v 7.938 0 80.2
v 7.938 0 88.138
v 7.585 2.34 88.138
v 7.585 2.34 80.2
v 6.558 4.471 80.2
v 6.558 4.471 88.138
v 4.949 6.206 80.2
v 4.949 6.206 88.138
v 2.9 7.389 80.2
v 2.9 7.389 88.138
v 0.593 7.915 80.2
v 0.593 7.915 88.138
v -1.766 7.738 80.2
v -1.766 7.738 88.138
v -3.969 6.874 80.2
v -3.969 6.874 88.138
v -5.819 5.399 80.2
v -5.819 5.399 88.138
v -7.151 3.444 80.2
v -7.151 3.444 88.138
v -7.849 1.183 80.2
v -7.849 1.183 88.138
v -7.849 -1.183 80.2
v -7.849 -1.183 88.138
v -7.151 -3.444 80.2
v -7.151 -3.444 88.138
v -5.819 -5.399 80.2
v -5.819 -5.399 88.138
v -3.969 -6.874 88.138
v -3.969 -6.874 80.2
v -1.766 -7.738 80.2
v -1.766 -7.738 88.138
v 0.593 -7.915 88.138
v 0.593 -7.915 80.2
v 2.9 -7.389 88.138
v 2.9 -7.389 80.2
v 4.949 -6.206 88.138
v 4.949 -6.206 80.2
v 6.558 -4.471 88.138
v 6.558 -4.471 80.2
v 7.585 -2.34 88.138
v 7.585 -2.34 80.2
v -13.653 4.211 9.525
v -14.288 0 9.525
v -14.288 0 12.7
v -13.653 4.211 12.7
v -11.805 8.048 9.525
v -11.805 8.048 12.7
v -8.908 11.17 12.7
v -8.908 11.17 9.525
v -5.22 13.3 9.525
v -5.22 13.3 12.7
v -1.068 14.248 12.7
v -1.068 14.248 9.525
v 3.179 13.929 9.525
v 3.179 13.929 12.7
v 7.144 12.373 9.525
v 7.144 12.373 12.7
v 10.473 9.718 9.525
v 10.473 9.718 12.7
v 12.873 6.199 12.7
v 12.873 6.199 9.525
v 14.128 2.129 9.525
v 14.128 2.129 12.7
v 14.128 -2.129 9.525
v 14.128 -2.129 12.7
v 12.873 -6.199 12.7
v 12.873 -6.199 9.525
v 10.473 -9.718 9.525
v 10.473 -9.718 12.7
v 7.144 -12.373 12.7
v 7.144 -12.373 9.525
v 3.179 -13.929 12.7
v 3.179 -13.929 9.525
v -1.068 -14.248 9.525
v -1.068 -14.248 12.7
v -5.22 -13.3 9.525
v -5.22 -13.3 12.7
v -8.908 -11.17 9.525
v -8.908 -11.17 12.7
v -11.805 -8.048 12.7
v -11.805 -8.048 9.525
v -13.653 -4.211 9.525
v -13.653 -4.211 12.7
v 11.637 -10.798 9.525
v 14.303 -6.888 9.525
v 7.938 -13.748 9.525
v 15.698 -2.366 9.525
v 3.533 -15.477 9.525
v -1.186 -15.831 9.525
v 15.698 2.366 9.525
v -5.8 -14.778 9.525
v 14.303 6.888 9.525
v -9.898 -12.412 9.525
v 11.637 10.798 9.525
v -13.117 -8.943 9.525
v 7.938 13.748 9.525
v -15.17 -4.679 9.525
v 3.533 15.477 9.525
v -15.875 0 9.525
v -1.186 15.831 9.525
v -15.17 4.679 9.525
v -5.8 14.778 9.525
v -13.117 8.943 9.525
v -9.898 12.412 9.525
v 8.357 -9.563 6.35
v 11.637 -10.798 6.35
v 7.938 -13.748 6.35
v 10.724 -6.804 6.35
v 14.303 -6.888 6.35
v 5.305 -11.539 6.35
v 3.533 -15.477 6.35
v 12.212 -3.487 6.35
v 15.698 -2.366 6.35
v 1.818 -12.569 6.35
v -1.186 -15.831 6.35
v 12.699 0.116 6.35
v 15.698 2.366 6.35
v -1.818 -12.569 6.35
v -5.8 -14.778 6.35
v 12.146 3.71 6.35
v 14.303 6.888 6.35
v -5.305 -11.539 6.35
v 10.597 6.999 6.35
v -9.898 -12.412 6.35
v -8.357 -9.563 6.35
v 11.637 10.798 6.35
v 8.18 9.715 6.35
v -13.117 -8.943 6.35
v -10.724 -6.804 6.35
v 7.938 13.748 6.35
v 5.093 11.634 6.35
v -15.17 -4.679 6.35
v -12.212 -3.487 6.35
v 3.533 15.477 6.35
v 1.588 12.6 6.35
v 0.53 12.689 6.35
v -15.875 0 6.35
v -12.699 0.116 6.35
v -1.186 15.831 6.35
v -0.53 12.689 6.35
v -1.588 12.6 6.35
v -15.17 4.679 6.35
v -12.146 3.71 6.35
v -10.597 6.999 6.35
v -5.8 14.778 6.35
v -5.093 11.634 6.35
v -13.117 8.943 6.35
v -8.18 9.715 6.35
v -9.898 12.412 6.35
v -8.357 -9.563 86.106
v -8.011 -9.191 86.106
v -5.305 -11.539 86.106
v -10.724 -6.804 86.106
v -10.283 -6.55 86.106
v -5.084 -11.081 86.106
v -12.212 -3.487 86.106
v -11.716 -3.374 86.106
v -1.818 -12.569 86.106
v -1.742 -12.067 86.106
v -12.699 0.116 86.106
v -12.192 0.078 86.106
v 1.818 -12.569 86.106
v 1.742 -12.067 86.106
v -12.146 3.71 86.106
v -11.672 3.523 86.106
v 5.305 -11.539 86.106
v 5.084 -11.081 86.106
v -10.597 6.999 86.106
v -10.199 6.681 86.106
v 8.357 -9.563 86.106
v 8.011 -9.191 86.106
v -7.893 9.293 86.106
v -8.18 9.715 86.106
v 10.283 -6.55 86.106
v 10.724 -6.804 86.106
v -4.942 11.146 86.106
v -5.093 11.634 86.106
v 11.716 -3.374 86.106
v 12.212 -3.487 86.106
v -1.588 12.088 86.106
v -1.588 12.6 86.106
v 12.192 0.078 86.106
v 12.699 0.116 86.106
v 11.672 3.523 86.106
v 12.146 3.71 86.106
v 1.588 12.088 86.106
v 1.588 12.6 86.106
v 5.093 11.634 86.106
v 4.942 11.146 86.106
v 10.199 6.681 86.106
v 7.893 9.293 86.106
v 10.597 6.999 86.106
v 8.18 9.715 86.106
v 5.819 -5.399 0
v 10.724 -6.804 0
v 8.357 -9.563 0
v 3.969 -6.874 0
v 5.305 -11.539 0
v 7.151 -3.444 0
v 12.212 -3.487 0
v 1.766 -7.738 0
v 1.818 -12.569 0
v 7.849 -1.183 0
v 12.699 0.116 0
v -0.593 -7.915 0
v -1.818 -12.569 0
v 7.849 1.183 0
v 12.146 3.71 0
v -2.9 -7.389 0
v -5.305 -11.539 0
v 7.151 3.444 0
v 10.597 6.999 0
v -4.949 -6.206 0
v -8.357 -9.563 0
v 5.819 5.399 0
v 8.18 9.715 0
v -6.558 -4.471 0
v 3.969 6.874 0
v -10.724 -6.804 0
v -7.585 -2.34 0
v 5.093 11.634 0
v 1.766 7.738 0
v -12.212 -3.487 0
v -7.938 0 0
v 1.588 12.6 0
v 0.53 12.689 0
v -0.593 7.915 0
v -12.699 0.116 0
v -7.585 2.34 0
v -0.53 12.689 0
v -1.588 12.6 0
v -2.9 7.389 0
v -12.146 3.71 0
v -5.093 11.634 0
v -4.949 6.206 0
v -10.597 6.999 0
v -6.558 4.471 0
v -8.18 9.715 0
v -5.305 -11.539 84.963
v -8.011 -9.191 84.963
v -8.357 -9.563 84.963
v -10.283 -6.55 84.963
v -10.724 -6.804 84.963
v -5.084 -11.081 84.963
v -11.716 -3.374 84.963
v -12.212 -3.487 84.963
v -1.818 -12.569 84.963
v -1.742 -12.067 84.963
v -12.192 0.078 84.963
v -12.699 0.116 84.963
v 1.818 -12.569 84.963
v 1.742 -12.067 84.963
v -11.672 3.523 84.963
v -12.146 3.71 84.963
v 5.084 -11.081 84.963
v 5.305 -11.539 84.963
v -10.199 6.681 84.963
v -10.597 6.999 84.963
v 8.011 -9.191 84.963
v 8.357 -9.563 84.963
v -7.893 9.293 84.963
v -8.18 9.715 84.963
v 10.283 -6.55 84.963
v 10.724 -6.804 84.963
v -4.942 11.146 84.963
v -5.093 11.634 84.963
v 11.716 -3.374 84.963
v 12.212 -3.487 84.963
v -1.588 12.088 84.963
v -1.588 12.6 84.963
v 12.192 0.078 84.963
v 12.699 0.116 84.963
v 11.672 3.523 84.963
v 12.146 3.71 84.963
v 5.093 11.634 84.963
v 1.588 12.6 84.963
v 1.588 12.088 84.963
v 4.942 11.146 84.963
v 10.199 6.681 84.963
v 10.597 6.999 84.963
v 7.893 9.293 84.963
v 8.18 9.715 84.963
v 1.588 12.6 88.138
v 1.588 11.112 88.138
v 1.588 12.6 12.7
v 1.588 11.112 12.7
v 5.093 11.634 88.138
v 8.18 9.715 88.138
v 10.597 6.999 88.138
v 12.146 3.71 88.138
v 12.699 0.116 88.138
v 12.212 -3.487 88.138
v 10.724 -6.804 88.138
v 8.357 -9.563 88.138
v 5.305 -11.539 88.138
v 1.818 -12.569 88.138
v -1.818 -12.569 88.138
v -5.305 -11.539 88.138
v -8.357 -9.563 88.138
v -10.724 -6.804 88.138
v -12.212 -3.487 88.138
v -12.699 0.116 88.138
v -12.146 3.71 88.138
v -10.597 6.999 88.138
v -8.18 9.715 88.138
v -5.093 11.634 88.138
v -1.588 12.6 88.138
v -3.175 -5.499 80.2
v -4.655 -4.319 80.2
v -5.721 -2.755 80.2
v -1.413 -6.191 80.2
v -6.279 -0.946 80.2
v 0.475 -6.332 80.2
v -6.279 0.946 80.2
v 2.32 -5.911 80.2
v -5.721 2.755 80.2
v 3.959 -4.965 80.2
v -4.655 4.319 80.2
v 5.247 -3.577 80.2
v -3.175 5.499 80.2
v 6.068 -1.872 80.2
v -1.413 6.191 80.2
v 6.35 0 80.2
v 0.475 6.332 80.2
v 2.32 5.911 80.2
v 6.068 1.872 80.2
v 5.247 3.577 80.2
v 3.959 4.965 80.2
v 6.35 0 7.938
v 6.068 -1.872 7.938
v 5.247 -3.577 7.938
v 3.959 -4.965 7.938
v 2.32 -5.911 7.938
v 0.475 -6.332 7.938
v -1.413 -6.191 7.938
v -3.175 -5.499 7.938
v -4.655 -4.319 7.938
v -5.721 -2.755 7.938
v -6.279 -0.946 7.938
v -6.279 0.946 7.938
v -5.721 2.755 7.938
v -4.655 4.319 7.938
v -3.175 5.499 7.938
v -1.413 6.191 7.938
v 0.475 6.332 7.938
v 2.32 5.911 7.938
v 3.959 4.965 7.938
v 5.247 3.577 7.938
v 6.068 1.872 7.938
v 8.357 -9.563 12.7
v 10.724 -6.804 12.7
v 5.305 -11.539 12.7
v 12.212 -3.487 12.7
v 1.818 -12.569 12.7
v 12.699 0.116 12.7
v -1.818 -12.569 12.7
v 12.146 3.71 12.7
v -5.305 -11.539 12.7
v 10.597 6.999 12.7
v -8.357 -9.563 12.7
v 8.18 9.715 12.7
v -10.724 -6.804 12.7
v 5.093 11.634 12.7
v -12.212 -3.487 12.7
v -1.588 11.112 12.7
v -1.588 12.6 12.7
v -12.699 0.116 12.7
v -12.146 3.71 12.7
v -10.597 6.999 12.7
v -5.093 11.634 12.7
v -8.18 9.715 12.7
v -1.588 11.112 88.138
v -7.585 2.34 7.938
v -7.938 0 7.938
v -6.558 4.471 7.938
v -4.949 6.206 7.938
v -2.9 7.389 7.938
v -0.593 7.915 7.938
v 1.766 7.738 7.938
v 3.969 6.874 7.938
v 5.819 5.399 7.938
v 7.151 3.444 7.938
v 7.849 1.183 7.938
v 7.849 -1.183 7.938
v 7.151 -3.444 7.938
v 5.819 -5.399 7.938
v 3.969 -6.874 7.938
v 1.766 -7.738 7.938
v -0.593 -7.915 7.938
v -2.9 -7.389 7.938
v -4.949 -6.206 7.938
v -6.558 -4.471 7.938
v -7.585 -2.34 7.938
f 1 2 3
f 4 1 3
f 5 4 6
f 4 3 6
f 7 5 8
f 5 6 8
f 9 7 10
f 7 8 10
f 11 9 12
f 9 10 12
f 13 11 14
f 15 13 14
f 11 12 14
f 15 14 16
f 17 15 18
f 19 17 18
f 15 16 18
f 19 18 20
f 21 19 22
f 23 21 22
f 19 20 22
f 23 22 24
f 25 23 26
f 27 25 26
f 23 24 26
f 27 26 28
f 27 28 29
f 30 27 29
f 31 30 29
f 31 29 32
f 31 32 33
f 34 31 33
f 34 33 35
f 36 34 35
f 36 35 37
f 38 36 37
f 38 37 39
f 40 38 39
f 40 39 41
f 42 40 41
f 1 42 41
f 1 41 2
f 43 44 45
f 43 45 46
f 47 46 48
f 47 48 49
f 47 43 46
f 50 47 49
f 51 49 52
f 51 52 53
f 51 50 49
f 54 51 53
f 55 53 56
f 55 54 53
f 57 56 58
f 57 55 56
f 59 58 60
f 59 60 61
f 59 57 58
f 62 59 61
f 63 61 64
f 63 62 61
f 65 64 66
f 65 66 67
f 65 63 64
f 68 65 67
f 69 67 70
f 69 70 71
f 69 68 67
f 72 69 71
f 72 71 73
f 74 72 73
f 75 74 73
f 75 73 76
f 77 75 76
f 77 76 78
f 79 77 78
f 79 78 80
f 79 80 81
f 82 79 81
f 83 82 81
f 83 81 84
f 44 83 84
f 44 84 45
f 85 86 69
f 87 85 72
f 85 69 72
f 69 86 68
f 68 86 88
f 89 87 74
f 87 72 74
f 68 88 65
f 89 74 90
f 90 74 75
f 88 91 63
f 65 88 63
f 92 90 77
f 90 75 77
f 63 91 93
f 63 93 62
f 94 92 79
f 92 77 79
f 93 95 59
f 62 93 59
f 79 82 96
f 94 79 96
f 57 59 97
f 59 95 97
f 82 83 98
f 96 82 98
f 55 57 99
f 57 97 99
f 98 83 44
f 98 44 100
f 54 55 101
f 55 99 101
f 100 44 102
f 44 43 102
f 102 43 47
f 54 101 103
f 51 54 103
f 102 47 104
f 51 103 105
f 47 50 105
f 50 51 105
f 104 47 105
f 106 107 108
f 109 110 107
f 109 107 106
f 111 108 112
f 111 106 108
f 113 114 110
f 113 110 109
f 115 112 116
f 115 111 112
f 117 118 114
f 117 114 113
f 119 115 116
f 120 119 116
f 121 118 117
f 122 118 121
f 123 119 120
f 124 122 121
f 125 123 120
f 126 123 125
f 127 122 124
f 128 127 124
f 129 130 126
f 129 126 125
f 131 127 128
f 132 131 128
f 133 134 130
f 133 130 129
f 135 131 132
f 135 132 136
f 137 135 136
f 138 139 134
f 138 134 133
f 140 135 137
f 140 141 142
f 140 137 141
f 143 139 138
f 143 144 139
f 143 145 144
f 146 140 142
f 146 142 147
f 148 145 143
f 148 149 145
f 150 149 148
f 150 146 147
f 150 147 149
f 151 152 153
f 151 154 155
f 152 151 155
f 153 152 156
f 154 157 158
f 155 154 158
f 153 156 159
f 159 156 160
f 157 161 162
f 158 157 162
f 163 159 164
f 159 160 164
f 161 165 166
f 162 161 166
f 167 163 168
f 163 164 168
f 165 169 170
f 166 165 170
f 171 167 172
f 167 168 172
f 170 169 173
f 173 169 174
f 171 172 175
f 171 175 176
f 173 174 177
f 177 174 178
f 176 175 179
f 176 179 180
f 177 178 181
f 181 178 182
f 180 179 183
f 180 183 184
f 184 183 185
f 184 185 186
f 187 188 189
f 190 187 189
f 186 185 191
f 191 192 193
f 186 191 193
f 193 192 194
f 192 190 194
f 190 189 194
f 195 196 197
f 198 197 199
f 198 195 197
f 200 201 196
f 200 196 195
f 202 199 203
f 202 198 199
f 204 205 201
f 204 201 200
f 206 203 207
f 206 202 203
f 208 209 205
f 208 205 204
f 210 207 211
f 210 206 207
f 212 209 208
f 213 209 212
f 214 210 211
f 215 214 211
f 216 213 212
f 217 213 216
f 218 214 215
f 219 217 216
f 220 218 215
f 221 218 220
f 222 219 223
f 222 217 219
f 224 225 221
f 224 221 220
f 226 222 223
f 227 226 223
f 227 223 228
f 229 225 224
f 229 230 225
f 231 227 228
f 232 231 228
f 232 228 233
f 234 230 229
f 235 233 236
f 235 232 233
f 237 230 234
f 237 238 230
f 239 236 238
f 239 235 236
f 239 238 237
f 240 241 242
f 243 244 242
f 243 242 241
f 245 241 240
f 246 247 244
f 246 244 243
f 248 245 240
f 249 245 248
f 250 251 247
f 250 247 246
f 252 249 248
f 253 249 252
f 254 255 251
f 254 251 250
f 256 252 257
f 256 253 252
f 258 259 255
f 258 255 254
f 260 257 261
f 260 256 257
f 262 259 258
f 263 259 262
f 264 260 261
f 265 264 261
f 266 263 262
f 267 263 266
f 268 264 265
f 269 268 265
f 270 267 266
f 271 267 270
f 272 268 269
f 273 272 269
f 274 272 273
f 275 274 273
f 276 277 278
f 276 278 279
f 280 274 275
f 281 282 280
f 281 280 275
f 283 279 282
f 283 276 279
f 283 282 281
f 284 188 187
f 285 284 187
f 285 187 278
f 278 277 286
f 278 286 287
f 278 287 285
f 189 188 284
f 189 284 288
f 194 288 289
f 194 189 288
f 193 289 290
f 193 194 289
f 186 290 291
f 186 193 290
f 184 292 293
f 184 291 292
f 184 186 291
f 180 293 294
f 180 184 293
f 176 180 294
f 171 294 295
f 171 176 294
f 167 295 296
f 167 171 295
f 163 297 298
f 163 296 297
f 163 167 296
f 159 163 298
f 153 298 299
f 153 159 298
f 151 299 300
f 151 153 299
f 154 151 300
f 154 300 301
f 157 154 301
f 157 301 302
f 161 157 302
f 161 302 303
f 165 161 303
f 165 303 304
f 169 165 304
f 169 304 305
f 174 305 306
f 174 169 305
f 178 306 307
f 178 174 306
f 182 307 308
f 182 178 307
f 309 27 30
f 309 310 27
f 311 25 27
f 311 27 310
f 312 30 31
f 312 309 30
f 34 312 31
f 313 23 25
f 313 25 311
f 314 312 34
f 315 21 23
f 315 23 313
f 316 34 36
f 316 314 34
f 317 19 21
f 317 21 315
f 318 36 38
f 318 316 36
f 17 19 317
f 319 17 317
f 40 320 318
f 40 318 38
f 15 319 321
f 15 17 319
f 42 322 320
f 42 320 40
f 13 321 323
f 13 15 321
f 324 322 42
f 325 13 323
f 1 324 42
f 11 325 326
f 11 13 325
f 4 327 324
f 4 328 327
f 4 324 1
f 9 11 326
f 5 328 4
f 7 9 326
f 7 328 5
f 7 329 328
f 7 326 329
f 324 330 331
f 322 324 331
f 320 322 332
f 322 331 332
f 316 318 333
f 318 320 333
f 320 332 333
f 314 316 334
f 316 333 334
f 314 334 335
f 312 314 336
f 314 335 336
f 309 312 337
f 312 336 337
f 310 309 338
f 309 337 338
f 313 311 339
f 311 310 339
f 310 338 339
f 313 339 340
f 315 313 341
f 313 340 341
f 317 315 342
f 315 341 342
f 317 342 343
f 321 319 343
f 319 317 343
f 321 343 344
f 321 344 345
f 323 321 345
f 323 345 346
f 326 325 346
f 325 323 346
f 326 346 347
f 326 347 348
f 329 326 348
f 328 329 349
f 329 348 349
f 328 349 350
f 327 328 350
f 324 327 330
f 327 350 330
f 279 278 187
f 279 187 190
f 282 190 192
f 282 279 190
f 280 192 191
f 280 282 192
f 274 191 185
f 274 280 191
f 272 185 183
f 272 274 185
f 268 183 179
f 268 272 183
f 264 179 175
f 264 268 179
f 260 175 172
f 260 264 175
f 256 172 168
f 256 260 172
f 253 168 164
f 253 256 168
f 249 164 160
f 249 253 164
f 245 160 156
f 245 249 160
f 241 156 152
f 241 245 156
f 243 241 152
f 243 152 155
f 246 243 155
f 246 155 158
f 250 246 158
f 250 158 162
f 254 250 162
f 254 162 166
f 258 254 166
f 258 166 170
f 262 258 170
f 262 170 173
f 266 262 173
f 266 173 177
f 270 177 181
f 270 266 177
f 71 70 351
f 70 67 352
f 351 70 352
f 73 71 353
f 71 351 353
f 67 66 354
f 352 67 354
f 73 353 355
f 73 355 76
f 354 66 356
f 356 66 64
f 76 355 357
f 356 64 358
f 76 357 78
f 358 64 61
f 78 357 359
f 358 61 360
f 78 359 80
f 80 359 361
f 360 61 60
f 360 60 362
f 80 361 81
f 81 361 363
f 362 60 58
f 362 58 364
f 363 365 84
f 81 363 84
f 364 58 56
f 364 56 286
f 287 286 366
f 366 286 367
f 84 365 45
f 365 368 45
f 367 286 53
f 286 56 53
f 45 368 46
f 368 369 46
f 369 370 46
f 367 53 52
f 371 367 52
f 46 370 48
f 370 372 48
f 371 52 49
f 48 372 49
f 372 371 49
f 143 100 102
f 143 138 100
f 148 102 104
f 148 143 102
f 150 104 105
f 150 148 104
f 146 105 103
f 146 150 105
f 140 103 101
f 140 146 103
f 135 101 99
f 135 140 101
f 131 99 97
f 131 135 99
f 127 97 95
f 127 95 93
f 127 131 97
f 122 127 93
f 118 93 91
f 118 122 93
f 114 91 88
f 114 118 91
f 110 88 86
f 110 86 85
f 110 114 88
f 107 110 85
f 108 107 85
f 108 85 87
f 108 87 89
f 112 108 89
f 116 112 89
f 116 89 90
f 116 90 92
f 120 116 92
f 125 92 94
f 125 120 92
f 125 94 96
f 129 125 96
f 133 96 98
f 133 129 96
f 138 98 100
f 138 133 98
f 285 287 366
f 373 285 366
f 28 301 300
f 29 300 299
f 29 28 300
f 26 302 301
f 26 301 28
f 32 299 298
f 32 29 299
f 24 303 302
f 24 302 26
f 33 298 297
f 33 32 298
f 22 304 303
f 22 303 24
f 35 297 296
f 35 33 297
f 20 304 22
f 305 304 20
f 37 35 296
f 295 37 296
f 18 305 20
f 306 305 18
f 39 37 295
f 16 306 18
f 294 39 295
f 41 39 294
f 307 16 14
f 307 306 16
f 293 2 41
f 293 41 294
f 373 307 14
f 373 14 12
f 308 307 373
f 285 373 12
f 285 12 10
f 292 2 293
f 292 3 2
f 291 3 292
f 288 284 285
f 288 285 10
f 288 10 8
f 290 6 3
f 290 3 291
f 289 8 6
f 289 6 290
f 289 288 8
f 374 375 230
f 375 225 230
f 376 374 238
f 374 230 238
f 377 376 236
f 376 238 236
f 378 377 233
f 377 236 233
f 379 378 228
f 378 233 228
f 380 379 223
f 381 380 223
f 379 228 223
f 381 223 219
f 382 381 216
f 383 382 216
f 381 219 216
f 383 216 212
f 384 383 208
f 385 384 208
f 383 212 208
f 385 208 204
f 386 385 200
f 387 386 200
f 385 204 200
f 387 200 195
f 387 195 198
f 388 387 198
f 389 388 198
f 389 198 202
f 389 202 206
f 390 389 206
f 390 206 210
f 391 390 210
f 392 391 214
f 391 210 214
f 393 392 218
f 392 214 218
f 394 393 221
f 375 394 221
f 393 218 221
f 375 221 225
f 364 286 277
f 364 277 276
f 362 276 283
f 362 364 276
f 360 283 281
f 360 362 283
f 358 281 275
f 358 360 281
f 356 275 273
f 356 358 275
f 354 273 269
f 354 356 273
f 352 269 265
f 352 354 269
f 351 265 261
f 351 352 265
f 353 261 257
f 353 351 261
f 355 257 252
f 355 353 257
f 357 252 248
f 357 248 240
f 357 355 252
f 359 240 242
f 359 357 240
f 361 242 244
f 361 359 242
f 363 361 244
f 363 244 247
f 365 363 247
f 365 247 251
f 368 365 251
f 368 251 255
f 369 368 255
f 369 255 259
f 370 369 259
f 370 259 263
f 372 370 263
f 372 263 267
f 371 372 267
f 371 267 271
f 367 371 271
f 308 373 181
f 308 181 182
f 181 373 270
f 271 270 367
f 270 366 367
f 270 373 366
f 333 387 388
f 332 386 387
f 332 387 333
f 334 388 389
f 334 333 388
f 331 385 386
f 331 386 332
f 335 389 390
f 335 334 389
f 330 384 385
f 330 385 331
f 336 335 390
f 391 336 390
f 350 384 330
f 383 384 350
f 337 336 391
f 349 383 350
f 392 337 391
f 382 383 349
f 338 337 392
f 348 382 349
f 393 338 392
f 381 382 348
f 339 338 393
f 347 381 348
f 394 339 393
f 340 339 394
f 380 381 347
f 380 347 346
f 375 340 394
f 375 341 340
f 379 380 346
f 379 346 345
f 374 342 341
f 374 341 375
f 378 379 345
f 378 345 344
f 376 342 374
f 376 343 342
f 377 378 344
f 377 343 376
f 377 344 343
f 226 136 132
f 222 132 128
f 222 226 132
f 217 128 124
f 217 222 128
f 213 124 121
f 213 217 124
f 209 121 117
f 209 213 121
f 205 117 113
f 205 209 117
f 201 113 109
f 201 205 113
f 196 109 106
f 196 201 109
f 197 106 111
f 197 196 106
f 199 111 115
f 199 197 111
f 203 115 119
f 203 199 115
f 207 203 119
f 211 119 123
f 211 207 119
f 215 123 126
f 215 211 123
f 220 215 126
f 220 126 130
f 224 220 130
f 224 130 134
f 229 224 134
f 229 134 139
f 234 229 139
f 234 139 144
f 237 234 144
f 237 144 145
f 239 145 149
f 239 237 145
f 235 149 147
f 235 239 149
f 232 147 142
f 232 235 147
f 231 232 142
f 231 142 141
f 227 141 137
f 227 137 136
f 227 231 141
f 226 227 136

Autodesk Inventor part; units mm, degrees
sketch "Sketch1" plane through (0, 0, 0) normal (0, 0, 1) x (1, 0, 0)
  circle A0 centre (0, 0) radius 12.7
  circle A1 centre (0, 0) radius 6.35
  line L0 (-1.5875, 14.2875) -> (1.5875, 14.2875)
  line L1 (1.5875, 14.2875) -> (1.5875, 11.1125)
  line L2 (1.5875, 11.1125) -> (-1.5875, 11.1125)
  line L3 (-1.5875, 11.1125) -> (-1.5875, 14.2875)
  dimension "d0" = 25.4
  dimension "d4" = 12.7
  dimension "d50" = 3.175
  dimension "d51" = 3.175
  dimension "d52" = 1.5875
  dimension "d53" = 14.2875
extrude "Extrusion4" add sketch "Sketch1" along normal blind 88.138 contours A0 L3 L2 L1 | L1 L2 L3 A0
ref_plane "Work Plane5" through (0, 0, 84.963) normal (0, 0, 1) x (1, 0, 0)
sketch "Sketch6" plane through (0, 0, 84.963) normal (0, 0, 1) x (1, 0, 0)
  circle A0 centre (0, 0) radius 12.192
  circle A1 centre (0, 0) radius 12.7 projected
  dimension "d24" = 24.384
extrude "Extrusion8" cut sketch "Sketch6" along normal blind 1.143
ref_plane "Work Plane6" through (0, 0, 15.113) normal (0, 0, -1) x (-1, 0, 0)
ref_plane "Work Plane9" through (0, 0, 43.3324) normal (0, 0, -1) x (-1, 0, 0)
ref_plane "Work Plane10" through (0, 0, 29.464) normal (0, 0, -1) x (-1, 0, 0)
extrude "Extrusion16" cut sketch "Sketch1" along normal through all contours L1 L2 L3 A0 | A0 L3 L0 L1 picked at (0.1768, 11.638)
sketch "Sketch14" plane through (0, 0, 88.138) normal (0, 0, 1) x (1, 0, 0)
  circle A0 centre (0, 0) radius 6.35 projected
  circle A1 centre (0, 0) radius 7.9375
  dimension "d56" = 15.875
extrude "Extrusion17" cut sketch "Sketch14" against normal blind 7.9375
sketch "Sketch15" plane through (0, 0, 0) normal (0, 0, -1) x (-1, 0, 0)
  circle A0 centre (0, 0) radius 6.35 projected
  circle A1 centre (0, 0) radius 7.9375
  dimension "d59" = 15.875
extrude "Extrusion18" cut sketch "Sketch15" against normal blind 7.9375
ref_plane "Work Plane13" through (0, 0, 6.35) normal (0, 0, -1) x (-1, 0, 0)
sketch "Sketch16" plane through (0, 0, 6.35) normal (0, 0, -1) x (-1, 0, 0)
  arc A0 (-1.5875, 12.6004) -> (1.5875, 12.6004) centre (0, 0) ccw projected
  line L0 (-1.5875, 12.6004) -> (-1.5875, 11.1125) projected
  line L1 (-1.5875, 11.1125) -> (1.5875, 11.1125) projected
  line L2 (1.5875, 11.1125) -> (1.5875, 12.6004) projected
  circle A1 centre (0, 0) radius 15.875
  circle A2 centre (0, 0) radius 14.2875
  dimension "d63" = 31.75
  dimension "d68" = 28.575
extrude "Extrusion19" add sketch "Sketch16" against normal blind 3.175 contours A1 | A2
sketch "Sketch17" plane through (0, 0, 0) normal (0, 0, -1) x (-1, 0, 0)
  line L0 (-1.5875, 11.1125) -> (-1.5875, 12.6004) projected
  arc A0 (-1.5875, 12.6004) -> (1.5875, 12.6004) centre (0, 0) ccw projected
  line L1 (1.5875, 12.6004) -> (1.5875, 11.1125) projected
  line L2 (1.5875, 11.1125) -> (-1.5875, 11.1125) projected
  arc A1 (1.5875, 12.6004) -> (-1.5875, 12.6004) centre (0, 0) ccw
extrude "Extrusion20" add sketch "Sketch17" against normal blind 6.35 contours L0 A1 L1 L2
extrude "Extrusion21" add sketch "Sketch16" against normal blind 6.35 contours A2
equation "\"d51\" = d50"
equation "\"d52\" = 0.5 * d50"
equation "\"d53\" = 0.5 * d0 + 0.5 * d50"
properties part number "turn shaft"
